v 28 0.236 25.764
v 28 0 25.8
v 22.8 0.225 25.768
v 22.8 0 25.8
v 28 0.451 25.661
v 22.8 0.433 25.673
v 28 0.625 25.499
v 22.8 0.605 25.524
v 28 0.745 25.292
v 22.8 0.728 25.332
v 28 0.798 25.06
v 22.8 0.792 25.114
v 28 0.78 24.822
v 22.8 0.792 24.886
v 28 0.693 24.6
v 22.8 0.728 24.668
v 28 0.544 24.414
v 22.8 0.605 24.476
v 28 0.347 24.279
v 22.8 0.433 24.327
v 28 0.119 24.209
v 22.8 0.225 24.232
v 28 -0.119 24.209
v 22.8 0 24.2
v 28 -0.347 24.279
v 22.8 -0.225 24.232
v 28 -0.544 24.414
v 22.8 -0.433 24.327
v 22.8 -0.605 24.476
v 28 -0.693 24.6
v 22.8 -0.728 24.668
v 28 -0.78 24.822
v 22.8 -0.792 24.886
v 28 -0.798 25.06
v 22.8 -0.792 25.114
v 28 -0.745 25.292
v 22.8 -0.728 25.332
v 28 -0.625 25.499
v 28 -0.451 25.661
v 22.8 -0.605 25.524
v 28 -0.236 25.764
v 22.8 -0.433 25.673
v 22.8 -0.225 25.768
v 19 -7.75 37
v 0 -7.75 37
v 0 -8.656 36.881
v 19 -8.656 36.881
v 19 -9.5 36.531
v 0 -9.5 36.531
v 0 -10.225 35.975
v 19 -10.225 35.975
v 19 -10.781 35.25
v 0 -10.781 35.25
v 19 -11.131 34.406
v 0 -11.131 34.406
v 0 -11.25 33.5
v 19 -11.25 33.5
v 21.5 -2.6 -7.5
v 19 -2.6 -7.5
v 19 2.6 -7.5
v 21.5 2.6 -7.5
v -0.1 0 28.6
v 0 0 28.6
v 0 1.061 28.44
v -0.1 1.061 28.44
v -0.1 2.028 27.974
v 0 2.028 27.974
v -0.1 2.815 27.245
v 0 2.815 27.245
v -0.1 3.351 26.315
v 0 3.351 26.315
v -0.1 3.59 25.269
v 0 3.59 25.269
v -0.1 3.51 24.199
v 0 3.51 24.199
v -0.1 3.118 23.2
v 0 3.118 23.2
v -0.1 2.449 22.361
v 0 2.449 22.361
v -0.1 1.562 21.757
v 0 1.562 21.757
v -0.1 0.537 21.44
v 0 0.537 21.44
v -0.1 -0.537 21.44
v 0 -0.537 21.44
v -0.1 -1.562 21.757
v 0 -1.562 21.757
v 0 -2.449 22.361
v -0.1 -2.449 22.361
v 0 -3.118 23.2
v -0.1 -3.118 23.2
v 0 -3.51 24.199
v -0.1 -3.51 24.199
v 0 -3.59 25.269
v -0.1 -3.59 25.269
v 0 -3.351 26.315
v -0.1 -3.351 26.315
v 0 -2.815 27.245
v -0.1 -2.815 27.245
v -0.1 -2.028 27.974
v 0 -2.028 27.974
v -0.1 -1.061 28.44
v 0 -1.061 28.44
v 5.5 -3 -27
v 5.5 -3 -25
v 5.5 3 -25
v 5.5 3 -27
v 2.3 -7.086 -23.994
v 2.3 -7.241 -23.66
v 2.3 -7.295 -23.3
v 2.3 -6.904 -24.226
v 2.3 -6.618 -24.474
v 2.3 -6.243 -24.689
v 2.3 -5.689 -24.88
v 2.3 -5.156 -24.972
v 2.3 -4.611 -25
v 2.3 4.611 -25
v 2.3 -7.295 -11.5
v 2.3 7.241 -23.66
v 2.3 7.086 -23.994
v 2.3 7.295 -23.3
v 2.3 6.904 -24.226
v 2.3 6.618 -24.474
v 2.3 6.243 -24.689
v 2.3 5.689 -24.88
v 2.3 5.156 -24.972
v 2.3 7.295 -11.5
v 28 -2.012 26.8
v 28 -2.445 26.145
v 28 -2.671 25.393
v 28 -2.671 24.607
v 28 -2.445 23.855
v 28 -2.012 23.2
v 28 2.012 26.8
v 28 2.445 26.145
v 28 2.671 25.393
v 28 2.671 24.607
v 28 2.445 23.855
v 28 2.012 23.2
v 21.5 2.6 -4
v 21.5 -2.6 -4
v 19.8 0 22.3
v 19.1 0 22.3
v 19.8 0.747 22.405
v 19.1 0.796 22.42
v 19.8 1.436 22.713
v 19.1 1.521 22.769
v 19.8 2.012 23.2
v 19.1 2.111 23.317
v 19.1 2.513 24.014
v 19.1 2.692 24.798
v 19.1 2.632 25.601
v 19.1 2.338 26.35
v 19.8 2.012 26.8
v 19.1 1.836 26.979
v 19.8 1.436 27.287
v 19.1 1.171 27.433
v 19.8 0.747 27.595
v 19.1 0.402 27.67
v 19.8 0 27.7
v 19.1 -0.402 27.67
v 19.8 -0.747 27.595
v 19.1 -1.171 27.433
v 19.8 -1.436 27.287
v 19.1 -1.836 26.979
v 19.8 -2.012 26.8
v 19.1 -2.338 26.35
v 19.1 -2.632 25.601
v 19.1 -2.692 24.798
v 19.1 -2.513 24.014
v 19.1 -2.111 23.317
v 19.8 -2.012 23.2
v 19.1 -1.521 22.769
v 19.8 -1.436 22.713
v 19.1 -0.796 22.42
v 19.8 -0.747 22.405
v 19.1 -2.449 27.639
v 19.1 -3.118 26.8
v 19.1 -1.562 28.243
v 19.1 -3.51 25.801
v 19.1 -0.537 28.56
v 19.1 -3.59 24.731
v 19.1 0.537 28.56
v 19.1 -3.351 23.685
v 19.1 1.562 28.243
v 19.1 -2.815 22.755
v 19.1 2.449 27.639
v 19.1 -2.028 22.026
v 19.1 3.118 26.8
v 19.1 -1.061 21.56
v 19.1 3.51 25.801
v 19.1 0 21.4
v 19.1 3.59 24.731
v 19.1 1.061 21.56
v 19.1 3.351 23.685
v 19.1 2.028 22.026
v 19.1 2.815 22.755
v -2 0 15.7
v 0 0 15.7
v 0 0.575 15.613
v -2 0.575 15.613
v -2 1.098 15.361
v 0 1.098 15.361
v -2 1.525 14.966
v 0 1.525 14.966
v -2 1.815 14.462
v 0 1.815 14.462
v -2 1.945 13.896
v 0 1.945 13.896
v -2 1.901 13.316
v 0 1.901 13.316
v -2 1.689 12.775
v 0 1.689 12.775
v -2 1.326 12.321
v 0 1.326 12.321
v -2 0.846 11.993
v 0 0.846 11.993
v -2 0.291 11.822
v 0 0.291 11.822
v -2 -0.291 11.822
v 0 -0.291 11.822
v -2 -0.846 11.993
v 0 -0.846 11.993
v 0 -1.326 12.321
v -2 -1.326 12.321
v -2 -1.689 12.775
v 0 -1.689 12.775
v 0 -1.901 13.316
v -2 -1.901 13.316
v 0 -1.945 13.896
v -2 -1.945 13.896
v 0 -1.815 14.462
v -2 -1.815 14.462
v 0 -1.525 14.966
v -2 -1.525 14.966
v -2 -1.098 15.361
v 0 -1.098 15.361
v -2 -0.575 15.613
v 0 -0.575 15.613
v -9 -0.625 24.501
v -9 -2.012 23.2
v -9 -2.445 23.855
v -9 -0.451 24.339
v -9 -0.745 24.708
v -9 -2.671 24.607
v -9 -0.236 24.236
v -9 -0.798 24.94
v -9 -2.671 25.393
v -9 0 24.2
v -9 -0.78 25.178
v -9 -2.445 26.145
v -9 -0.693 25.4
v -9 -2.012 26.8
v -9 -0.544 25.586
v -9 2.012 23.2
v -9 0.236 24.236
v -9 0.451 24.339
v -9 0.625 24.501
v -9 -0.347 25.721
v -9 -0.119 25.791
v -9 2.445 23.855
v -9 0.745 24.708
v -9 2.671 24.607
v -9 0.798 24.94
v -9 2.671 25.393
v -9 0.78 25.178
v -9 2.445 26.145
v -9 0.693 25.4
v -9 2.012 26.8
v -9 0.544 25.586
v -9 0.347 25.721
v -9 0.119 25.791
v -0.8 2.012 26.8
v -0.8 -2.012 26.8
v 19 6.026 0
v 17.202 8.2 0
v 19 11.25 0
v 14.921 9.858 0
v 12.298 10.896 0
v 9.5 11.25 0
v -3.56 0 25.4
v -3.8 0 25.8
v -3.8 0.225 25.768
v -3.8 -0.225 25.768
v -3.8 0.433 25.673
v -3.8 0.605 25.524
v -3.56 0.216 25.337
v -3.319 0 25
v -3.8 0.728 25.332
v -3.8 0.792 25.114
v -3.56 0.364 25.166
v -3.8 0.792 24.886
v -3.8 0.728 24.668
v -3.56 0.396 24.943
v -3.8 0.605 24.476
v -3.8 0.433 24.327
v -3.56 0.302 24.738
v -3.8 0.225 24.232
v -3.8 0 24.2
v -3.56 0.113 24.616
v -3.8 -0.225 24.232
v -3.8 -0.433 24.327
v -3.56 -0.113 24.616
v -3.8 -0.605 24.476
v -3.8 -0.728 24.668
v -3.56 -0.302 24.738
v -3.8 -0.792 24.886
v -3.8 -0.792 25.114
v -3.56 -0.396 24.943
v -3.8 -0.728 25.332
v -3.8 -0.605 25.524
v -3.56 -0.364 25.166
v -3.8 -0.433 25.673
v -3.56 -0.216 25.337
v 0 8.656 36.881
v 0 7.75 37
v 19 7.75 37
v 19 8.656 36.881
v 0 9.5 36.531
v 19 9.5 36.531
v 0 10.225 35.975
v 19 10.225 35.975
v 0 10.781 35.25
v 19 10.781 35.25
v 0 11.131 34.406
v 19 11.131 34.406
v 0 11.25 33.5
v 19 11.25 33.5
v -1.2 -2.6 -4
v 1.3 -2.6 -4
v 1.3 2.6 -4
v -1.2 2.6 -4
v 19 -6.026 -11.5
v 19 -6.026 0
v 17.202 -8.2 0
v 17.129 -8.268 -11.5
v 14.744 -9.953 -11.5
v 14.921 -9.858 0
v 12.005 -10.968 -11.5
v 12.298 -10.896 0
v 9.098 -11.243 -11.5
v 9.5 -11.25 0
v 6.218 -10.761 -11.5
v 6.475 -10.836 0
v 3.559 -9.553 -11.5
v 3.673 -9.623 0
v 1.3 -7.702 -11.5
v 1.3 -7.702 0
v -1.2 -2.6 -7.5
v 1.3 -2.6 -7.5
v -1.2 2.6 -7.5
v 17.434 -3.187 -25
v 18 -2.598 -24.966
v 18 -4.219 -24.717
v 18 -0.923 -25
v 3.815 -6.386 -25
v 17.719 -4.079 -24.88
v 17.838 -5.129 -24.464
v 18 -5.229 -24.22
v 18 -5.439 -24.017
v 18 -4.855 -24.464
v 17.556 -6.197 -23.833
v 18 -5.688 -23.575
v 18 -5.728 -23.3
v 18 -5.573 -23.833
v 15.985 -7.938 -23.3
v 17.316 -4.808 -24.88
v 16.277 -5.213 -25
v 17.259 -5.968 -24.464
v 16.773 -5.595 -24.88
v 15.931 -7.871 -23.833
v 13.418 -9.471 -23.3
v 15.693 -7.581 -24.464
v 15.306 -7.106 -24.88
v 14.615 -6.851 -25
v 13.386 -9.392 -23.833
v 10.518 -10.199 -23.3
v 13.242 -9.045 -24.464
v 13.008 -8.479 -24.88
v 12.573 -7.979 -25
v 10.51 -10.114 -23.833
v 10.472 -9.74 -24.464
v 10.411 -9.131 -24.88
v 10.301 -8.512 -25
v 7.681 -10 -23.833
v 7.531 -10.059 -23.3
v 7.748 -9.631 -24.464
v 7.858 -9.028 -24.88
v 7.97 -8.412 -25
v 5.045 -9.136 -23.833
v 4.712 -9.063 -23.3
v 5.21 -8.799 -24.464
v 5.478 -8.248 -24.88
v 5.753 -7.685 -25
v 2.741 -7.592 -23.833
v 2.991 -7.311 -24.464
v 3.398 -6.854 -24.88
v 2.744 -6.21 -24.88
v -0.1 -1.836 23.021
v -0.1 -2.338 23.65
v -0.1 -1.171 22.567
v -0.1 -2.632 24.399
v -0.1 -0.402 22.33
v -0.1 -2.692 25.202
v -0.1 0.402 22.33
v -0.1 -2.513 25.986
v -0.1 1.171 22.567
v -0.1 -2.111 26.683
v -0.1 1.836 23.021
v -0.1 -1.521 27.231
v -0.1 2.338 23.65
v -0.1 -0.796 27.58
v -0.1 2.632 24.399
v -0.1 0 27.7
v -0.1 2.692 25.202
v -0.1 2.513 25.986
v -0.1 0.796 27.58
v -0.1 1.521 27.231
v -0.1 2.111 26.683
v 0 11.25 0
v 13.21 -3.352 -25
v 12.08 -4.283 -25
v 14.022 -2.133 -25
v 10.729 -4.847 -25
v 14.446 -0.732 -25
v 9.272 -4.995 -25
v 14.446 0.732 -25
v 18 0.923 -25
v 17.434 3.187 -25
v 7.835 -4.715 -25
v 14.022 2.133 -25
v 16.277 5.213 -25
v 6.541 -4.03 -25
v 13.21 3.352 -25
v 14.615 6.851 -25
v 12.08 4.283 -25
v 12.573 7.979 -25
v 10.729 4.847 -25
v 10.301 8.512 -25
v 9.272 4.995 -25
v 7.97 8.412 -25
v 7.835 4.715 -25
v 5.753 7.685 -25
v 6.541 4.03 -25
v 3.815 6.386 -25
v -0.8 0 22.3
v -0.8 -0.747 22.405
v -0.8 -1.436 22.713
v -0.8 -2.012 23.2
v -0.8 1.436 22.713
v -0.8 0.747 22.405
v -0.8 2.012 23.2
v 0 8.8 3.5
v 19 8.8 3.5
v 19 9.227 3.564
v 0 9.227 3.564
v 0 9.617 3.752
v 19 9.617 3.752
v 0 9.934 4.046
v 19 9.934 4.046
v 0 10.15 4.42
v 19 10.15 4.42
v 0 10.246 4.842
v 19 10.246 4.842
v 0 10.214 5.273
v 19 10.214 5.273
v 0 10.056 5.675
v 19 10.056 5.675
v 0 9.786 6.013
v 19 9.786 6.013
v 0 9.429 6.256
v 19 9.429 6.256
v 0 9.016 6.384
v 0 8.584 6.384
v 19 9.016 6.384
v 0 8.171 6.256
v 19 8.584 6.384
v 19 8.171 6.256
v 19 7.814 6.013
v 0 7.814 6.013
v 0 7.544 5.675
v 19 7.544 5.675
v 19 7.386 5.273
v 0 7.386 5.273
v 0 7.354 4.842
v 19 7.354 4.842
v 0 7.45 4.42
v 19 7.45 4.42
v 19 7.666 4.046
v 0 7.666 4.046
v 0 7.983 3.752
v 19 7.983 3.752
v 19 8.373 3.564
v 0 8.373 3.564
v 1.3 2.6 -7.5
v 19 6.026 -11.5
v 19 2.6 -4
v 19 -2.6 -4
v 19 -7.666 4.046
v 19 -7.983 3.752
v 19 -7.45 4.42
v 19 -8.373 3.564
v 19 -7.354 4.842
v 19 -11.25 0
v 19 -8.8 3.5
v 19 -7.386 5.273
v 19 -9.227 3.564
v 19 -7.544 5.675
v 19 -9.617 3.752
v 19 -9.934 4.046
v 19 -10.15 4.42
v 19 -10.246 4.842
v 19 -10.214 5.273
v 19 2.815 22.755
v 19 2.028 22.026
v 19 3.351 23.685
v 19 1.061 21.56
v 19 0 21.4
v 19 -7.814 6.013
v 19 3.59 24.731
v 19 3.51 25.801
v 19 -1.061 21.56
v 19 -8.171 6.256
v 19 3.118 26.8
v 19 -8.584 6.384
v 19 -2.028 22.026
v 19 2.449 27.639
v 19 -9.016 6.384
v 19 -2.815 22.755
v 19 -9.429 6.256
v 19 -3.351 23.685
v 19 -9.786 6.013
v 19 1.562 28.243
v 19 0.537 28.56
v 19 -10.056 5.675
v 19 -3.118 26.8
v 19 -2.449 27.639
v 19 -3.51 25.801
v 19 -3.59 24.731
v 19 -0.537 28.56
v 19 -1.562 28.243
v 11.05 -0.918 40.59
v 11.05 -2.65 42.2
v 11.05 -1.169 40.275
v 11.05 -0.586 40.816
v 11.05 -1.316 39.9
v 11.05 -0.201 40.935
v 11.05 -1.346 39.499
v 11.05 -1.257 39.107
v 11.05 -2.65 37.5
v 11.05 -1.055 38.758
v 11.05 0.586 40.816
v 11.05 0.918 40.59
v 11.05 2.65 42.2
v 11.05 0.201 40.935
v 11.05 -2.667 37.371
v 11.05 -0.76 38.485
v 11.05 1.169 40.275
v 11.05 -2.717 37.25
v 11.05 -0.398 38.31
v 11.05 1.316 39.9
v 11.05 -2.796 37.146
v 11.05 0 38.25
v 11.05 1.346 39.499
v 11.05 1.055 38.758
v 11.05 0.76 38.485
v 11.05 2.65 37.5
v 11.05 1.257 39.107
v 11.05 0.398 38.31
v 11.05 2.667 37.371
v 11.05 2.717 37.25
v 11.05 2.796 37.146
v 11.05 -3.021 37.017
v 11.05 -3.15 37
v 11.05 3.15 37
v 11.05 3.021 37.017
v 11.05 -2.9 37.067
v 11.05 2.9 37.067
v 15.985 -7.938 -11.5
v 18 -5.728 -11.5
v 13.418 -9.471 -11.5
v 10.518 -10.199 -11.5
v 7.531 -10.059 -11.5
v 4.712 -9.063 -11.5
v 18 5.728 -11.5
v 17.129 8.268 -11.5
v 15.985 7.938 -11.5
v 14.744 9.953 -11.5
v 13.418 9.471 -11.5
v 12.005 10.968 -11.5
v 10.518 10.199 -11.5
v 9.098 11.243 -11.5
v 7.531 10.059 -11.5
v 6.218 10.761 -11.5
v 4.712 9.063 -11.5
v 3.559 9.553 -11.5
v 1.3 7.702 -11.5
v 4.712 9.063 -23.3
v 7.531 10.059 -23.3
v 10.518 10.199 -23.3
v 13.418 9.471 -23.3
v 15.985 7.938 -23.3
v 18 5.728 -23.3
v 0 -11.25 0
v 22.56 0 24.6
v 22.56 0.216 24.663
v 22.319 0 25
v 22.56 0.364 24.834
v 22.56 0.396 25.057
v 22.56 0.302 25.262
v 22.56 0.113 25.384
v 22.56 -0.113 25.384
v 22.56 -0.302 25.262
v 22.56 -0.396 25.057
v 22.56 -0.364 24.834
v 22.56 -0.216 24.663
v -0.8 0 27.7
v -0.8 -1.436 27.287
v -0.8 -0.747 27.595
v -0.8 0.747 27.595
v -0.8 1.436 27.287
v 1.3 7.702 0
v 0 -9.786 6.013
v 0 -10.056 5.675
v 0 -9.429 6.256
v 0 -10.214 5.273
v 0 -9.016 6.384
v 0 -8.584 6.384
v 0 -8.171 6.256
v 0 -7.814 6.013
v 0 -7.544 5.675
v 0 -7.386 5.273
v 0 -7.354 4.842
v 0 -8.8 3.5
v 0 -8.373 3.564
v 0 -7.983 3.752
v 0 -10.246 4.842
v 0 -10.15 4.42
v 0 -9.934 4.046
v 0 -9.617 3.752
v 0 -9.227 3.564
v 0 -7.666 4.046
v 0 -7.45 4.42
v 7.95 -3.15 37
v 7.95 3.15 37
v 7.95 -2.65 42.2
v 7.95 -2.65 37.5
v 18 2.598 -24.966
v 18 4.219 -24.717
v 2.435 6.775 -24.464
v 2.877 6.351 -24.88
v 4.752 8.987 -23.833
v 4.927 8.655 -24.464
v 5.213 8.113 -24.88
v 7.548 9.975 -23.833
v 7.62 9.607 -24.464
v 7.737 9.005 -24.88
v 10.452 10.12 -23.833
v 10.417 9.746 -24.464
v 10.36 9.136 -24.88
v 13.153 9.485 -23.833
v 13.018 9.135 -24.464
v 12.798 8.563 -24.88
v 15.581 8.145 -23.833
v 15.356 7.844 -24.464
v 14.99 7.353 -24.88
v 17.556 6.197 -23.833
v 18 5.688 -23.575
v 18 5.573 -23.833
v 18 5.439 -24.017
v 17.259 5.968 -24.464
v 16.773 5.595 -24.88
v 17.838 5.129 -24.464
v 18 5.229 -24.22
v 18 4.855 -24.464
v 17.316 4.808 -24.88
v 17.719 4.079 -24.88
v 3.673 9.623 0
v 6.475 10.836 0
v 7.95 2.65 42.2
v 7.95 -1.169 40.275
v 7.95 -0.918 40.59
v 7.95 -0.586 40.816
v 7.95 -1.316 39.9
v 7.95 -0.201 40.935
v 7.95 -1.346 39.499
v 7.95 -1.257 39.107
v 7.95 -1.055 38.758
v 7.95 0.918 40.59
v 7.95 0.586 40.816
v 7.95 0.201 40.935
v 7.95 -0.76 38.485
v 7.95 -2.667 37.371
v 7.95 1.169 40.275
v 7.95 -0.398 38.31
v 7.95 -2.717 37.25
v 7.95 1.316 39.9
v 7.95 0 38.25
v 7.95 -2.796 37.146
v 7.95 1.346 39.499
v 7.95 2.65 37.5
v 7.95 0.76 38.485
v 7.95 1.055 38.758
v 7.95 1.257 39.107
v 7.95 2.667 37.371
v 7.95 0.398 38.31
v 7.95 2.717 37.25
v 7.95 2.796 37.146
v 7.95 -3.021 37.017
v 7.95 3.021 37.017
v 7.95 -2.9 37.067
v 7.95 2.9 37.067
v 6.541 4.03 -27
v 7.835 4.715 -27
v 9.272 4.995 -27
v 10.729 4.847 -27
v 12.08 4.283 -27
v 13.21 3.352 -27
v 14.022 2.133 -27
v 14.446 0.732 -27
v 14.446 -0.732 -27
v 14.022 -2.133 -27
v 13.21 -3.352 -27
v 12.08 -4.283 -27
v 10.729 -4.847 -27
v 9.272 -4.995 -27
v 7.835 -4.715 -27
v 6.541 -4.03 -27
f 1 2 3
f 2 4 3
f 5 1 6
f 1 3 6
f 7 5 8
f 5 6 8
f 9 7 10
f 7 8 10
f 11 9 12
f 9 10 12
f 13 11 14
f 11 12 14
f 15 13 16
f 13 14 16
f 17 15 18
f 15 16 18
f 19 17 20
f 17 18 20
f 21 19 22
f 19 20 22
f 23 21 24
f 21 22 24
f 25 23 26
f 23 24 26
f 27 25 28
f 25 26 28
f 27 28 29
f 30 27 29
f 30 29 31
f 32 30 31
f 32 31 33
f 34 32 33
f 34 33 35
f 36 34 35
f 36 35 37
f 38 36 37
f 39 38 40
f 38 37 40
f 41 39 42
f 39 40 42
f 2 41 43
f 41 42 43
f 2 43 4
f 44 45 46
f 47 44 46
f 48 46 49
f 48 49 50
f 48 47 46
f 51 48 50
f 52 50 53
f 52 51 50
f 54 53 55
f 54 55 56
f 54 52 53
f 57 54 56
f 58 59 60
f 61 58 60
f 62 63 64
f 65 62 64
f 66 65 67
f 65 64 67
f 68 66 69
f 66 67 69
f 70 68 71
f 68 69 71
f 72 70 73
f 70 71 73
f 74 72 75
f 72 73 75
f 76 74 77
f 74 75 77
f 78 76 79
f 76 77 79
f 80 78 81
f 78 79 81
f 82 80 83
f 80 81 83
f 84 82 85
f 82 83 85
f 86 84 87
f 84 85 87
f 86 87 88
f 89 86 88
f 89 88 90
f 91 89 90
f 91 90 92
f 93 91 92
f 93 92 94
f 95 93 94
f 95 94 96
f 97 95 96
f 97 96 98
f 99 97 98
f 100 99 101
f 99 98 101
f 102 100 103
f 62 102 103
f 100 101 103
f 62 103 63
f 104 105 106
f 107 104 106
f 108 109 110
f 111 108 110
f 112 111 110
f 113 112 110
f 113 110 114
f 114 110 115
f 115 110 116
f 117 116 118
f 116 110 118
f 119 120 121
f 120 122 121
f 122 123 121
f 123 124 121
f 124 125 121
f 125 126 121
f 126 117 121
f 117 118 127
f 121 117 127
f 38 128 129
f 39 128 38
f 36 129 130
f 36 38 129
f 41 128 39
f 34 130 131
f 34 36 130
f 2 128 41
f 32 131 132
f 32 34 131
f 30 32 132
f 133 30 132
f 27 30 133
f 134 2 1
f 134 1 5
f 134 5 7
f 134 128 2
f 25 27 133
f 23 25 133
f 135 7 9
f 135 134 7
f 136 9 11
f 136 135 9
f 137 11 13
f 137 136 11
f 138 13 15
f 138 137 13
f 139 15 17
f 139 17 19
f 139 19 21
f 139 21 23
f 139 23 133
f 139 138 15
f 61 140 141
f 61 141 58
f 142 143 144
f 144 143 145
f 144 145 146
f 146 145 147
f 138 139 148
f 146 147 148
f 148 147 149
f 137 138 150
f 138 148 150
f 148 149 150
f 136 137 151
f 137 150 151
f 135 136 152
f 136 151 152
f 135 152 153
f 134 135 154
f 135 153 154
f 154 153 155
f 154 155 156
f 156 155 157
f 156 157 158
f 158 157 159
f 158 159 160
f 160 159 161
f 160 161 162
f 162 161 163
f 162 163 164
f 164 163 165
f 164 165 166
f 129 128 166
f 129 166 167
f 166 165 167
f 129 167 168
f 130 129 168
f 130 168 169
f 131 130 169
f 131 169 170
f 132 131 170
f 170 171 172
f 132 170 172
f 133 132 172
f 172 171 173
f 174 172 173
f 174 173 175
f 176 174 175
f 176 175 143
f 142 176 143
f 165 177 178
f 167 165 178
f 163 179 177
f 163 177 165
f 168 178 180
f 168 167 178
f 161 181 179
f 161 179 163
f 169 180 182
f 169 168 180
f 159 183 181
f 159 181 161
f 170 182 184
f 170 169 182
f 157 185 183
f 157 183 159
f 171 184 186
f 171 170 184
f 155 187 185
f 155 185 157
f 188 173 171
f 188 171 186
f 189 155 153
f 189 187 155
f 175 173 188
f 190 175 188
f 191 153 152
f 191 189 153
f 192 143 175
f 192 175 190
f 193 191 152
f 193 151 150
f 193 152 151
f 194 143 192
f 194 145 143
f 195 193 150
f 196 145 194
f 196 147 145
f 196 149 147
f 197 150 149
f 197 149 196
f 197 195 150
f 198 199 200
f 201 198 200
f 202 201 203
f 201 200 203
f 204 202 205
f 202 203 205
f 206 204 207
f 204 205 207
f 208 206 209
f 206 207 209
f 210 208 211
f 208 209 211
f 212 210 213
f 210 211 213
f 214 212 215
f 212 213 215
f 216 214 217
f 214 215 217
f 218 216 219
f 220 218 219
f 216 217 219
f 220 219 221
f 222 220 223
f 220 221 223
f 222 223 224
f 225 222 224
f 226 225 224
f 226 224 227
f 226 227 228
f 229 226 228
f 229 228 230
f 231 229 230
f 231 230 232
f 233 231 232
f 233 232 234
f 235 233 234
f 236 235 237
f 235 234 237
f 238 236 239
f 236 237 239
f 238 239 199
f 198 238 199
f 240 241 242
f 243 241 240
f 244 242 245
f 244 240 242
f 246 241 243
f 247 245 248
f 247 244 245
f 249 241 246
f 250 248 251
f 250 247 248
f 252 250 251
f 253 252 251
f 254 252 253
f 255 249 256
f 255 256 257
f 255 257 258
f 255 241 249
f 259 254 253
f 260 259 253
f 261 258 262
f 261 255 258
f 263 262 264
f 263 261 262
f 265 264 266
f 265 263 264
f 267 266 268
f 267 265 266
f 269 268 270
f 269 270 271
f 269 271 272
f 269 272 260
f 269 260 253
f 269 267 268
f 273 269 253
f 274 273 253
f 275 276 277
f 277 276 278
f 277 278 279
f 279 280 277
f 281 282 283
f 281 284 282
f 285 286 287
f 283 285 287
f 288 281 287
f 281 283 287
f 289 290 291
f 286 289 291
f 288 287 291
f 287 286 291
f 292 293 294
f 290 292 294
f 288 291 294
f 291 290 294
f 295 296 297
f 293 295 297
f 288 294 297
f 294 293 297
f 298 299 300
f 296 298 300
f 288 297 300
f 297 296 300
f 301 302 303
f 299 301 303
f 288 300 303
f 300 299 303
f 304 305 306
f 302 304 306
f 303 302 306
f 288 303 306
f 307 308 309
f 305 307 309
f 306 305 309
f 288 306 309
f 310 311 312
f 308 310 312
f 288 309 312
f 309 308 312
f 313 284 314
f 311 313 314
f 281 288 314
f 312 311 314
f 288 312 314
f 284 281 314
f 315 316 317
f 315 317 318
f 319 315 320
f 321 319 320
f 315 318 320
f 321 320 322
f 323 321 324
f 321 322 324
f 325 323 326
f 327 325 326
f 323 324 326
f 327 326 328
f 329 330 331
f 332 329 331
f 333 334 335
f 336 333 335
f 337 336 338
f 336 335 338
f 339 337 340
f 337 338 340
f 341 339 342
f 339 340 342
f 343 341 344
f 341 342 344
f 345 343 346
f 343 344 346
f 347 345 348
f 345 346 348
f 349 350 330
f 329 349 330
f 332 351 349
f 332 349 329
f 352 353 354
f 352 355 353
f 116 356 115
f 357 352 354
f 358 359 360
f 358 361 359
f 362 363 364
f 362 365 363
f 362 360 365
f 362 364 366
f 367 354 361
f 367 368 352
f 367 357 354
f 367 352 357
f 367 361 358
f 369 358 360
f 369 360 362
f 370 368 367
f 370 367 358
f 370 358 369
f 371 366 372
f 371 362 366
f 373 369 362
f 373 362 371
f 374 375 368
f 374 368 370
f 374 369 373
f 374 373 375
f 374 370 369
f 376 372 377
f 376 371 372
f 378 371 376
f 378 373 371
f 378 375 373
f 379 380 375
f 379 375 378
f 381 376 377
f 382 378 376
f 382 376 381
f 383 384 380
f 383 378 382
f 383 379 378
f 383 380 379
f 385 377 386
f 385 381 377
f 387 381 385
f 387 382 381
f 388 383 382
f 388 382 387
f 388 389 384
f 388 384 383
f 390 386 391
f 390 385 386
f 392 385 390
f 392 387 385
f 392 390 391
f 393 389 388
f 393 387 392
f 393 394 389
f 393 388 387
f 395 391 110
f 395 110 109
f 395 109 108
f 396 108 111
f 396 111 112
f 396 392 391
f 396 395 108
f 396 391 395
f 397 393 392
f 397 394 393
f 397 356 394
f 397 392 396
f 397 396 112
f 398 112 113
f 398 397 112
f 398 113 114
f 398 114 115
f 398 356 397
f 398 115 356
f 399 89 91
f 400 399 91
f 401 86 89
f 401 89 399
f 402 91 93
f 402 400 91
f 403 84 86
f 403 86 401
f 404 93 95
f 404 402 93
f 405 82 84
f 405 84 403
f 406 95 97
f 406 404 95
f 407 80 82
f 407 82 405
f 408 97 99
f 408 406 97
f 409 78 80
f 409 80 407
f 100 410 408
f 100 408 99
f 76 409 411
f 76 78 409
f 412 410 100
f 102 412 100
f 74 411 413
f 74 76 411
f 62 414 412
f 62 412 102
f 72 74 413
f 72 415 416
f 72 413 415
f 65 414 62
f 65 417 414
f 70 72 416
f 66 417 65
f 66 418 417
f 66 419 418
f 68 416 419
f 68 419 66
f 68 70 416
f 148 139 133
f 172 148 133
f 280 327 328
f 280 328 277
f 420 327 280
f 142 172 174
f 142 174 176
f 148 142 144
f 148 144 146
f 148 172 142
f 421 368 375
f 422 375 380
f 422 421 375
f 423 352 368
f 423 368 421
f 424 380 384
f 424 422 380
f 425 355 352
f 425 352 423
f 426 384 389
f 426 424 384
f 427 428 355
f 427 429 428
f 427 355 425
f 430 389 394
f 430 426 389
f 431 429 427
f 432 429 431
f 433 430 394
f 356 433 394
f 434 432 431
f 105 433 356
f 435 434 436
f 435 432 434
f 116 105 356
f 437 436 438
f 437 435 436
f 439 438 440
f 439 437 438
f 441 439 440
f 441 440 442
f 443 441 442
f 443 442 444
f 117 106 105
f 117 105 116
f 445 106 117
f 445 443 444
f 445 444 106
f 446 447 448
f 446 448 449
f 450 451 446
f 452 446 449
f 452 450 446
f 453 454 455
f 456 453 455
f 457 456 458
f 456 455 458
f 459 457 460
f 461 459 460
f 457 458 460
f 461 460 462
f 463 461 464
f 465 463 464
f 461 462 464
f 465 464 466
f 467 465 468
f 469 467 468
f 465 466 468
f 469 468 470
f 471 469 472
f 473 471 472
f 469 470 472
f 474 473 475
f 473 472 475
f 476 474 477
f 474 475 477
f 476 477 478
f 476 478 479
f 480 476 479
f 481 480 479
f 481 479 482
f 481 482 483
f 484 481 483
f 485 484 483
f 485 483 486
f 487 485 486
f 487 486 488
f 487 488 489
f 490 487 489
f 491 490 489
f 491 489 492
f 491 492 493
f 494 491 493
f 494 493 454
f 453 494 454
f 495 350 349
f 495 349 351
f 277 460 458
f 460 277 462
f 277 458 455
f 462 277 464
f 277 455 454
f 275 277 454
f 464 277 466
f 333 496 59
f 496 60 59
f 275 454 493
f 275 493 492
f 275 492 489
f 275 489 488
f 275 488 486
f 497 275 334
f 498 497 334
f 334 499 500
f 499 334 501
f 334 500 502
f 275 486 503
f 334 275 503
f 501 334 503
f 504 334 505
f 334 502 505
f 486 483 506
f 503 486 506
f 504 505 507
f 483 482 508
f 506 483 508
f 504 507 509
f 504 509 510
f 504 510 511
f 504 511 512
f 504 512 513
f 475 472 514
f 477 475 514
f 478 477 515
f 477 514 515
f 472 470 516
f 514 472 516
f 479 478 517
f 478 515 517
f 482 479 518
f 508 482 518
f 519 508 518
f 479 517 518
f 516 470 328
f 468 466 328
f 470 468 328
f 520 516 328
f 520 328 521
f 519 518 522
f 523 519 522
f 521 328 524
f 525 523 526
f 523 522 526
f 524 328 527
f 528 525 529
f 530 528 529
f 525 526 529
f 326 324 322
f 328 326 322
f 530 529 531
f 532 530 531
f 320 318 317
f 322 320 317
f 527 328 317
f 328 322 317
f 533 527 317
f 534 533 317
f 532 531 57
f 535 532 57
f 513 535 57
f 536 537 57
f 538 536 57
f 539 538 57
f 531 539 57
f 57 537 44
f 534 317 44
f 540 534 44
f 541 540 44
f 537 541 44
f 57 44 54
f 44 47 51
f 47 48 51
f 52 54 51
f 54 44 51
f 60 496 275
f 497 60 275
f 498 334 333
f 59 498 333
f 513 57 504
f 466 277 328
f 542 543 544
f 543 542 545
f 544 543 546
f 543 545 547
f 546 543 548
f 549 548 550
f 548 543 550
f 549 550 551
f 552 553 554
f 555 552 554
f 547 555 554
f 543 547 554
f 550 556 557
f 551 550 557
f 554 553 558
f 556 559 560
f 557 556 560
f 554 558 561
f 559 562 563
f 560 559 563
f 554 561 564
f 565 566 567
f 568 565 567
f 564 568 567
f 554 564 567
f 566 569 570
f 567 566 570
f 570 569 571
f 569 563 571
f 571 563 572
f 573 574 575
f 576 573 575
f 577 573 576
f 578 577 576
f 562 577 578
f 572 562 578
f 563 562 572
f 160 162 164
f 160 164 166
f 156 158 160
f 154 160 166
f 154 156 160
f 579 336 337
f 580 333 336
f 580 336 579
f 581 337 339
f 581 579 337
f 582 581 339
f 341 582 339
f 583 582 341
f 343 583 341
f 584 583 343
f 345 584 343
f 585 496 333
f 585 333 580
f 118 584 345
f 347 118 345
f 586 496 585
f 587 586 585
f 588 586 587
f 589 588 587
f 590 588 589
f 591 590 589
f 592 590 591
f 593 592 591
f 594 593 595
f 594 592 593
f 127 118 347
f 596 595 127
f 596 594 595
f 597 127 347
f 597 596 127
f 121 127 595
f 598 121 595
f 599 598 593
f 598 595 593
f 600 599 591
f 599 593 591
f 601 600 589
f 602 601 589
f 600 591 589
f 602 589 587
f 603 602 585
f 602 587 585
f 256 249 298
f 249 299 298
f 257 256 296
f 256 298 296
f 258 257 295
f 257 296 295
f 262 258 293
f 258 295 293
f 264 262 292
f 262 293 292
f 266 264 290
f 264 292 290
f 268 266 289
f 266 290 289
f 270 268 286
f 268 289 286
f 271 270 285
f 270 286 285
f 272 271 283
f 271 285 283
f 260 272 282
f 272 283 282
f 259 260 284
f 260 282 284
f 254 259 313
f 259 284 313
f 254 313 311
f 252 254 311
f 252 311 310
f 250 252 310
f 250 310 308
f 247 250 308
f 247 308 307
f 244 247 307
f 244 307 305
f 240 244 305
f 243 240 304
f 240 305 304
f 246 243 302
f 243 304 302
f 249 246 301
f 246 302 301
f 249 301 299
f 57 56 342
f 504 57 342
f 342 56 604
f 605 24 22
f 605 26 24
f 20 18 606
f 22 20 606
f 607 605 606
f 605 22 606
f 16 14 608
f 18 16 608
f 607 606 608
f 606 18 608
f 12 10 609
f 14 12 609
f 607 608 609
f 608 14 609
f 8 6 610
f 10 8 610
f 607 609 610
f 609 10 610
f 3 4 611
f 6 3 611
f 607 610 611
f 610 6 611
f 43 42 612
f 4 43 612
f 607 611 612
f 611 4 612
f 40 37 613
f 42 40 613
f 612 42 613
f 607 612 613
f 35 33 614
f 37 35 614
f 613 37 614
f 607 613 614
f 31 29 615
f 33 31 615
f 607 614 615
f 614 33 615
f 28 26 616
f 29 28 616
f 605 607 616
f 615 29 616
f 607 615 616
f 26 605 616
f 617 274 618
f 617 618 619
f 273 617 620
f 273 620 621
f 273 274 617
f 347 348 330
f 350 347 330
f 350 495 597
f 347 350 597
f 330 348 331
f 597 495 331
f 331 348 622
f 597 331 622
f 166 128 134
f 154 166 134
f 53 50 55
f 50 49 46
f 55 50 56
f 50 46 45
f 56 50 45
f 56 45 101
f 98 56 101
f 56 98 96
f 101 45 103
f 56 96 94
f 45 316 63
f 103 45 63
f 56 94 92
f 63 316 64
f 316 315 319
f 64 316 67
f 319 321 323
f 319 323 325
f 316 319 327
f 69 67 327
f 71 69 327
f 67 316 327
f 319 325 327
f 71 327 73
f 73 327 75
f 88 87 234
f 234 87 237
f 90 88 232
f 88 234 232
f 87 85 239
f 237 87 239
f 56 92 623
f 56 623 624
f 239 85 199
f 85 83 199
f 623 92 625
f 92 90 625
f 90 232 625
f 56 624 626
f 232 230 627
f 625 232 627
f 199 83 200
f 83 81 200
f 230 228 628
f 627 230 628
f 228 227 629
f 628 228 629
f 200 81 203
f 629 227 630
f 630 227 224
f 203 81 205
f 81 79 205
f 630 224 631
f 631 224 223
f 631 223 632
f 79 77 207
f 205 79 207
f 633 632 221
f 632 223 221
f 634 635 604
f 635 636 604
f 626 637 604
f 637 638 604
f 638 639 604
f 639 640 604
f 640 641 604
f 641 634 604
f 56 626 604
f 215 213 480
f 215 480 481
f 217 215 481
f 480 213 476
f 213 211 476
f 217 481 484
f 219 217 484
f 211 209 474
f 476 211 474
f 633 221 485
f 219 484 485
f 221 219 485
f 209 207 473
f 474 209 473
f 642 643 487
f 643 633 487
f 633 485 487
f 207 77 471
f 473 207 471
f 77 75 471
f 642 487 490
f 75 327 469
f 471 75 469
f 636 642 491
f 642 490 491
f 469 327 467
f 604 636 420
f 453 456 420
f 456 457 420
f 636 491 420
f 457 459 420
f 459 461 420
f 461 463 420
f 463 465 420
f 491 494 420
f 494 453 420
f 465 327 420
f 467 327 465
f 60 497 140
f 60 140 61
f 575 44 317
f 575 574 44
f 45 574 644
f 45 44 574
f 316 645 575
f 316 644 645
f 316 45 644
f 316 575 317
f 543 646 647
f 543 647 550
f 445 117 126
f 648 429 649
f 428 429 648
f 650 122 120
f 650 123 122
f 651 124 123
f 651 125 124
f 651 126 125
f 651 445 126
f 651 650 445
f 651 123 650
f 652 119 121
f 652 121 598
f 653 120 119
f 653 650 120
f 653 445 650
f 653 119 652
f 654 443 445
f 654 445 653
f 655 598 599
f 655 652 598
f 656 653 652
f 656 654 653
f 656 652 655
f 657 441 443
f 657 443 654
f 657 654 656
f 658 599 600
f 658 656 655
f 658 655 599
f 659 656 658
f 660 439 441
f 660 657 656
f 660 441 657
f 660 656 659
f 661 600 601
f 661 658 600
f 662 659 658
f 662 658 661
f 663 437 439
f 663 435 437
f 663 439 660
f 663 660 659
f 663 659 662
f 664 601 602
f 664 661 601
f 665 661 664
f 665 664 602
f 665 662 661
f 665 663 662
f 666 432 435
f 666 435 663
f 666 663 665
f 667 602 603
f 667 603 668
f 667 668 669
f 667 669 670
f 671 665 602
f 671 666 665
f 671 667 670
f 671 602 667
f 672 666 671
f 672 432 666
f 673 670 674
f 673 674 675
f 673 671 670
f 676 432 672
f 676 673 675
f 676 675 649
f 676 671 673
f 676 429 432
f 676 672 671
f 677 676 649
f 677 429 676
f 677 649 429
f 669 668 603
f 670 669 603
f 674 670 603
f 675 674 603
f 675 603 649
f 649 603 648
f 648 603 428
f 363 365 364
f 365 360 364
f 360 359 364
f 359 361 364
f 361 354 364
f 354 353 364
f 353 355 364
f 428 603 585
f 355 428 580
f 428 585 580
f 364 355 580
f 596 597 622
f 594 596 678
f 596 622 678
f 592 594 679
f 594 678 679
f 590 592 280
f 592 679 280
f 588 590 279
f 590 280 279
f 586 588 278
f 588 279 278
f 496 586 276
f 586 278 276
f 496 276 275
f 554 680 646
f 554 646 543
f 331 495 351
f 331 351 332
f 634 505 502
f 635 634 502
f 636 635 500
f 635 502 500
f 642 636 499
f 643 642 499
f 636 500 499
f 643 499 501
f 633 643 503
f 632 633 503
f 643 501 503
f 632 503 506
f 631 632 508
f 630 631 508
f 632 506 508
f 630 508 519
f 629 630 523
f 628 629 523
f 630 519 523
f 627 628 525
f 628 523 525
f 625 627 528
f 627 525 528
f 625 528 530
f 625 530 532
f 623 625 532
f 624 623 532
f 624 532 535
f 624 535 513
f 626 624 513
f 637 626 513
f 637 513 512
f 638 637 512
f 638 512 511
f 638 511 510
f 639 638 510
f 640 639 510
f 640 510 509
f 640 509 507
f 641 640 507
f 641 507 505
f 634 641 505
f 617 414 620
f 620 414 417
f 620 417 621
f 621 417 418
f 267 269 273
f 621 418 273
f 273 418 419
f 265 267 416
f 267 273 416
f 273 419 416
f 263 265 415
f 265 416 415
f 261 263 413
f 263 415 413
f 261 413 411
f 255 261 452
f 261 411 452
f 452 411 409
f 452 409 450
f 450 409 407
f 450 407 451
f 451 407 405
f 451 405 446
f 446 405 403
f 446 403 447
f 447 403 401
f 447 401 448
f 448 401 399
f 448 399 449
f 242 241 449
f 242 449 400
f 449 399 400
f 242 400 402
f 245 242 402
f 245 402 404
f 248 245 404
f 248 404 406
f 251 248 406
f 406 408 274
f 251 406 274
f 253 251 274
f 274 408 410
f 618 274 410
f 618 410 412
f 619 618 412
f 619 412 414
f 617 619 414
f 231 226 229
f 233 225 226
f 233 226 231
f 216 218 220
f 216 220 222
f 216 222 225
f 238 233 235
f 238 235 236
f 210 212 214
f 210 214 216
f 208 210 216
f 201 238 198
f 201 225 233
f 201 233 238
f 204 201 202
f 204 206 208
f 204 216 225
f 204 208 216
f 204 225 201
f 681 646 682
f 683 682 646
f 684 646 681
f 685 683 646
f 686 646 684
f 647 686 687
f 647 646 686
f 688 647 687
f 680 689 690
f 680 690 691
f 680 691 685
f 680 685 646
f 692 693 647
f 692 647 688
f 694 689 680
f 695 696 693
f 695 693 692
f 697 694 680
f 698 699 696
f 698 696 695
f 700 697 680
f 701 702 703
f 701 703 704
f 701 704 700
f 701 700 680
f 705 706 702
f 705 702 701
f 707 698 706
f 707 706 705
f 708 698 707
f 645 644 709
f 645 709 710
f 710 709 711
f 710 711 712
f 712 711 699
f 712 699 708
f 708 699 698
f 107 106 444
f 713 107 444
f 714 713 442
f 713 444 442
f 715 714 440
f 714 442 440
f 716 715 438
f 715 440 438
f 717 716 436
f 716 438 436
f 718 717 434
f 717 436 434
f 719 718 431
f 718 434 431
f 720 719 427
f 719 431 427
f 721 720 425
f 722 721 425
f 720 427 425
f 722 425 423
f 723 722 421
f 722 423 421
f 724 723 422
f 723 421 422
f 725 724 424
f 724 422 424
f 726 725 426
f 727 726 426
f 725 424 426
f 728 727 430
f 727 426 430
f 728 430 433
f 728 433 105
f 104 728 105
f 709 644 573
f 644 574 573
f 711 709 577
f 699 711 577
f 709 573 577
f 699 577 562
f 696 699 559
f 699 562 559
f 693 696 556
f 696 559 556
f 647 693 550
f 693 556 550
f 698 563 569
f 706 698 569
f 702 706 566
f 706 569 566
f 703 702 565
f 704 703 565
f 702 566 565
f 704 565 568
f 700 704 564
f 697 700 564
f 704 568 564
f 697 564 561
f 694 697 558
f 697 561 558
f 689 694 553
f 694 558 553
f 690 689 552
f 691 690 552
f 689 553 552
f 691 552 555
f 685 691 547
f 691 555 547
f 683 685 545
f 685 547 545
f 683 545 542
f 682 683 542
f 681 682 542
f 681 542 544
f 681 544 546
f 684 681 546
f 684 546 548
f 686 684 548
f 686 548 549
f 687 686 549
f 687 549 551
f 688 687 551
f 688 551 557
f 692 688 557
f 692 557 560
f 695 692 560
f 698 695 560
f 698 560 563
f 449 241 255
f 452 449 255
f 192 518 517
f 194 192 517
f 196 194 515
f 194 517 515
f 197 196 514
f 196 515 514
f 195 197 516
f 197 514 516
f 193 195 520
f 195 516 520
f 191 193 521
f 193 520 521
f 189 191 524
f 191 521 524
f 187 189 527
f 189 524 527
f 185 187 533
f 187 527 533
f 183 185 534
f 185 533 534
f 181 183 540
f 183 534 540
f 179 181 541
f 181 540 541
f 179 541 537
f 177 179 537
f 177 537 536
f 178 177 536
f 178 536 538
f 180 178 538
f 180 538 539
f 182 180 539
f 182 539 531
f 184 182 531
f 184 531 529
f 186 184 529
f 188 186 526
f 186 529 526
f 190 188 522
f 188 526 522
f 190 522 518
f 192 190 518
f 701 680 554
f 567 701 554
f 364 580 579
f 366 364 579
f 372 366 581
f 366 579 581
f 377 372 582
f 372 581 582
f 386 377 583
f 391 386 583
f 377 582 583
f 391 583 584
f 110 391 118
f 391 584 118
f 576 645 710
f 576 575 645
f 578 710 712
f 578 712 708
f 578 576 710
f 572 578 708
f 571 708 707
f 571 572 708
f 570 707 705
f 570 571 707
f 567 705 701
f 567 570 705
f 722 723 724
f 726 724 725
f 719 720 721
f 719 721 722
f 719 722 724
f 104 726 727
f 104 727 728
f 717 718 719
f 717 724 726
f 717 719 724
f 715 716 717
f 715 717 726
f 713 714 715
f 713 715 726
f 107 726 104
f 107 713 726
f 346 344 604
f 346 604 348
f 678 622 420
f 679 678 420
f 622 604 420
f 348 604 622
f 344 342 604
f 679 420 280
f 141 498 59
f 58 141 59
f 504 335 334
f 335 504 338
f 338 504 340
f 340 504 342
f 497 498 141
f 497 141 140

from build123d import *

# Parameters (mm, degrees)
SKETCH1_W                 = 37
SKETCH1_H                 = 22.5
BOSS_EXTRUDE1_DEPTH       = 19
SKETCH2_W                 = 3.1
SKETCH2_H                 = 5.3
BOSS_EXTRUDE2_DEPTH       = 5.2
SKETCH3_R                 = 1.35
CUT_EXTRUDE1_DEPTH        = 12.05
FILLET1_R                 = 3.5
SKETCH4_R                 = 3.6
BOSS_EXTRUDE3_DEPTH       = 0.1
SKETCH5_R                 = 3.6
BOSS_EXTRUDE4_DEPTH       = 0.1
SKETCH6_R                 = 2.7
BOSS_EXTRUDE5_DEPTH       = 8.9
SKETCH7_R                 = 2.7
BOSS_EXTRUDE6_DEPTH       = 8.9
FILLET2_R                 = 0.5
CUT_EXTRUDE2_DEPTH        = 8.2
CUT_EXTRUDE3_DEPTH        = 8.2
M2X0_4_TAPPED_HOLE1_D     = 1.6
M2X0_4_TAPPED_HOLE1_DEPTH = 5.2
M2X0_4_TAPPED_HOLE1_TIP   = 0.480688495
M2X0_4_TAPPED_HOLE2_D     = 1.6
M2X0_4_TAPPED_HOLE2_DEPTH = 5.2
M2X0_4_TAPPED_HOLE2_TIP   = 0.480688495
SKETCH16_R                = 1.95
BOSS_EXTRUDE7_DEPTH       = 2
BOSS_EXTRUDE8_DEPTH       = 11.5
SKETCH18_W                = 3.5
SKETCH18_H                = 5.2
BOSS_EXTRUDE9_DEPTH       = 2.5
SKETCH19_W                = 3.5
SKETCH19_H                = 5.2
BOSS_EXTRUDE10_DEPTH      = 2.5
BOSS_EXTRUDE11_DEPTH      = 13.5
FILLET3_R                 = 1.7
BOSS_EXTRUDE12_DEPTH      = 2
SKETCH25_R                = 1.45
CUT_EXTRUDE5_DEPTH        = 29


with BuildPart() as part:
    # Sketch1 → Boss-Extrude1 (new body)
    with BuildSketch(Plane(origin=(0, 0, 0), x_dir=(0, 0, -1), z_dir=(1, 0, 0))):
        with Locations((-18.5, 0)):
            Rectangle(SKETCH1_W, SKETCH1_H)
    extrude(amount=BOSS_EXTRUDE1_DEPTH)

    # Sketch2 → Boss-Extrude2 (add)
    with BuildSketch(Plane.XY.offset(37)):
        with Locations((9.5, 0)):
            Rectangle(SKETCH2_W, SKETCH2_H)
    extrude(amount=BOSS_EXTRUDE2_DEPTH)

    # Sketch3 → Cut-Extrude1 (cut, through all)
    with BuildSketch(Plane(origin=(11.05, 0, 0), x_dir=(0, 0, -1), z_dir=(1, 0, 0))):
        with Locations((-39.6, 0)):
            Circle(SKETCH3_R)
    extrude(amount=-CUT_EXTRUDE1_DEPTH, mode=Mode.SUBTRACT)

    # Fillet1
    fillet1_edges = [part.edges().sort_by_distance(p)[0] for p in [
        (9.5, -11.25, 37),
        (9.5, 11.25, 37),
    ]]
    fillet(fillet1_edges, radius=FILLET1_R)

    # Sketch4 → Boss-Extrude3 (add)
    with BuildSketch(Plane(origin=(19, 0, 0), x_dir=(0, 0, -1), z_dir=(1, 0, 0))):
        with Locations((-25, 0)):
            Circle(SKETCH4_R)
    extrude(amount=BOSS_EXTRUDE3_DEPTH)

    # Sketch5 → Boss-Extrude4 (add)
    with BuildSketch(Plane.ZY):
        with Locations((25, 0)):
            Circle(SKETCH5_R)
    extrude(amount=BOSS_EXTRUDE4_DEPTH)

    # Sketch6 → Boss-Extrude5 (add)
    with BuildSketch(Plane(origin=(19.1, 0, 0), x_dir=(0, 0, -1), z_dir=(1, 0, 0))):
        with Locations((-25, 0)):
            Circle(SKETCH6_R)
    extrude(amount=BOSS_EXTRUDE5_DEPTH)

    # Sketch7 → Boss-Extrude6 (add)
    with BuildSketch(Plane.ZY.offset(0.1)):
        with Locations((25, 0)):
            Circle(SKETCH7_R)
    extrude(amount=BOSS_EXTRUDE6_DEPTH)

    # Fillet2
    fillet2_edges = [part.edges().sort_by_distance(p)[0] for p in [
        (9.5, 2.65, 37),
        (9.5, -2.65, 37),
    ]]
    fillet(fillet2_edges, radius=FILLET2_R)

    # Sketch8 → Cut-Extrude2 (cut)
    with BuildSketch(Plane(origin=(28, 0, 0), x_dir=(0, 0, -1), z_dir=(1, 0, 0))):
        with BuildLine():
            Line((-26.8, -2.01246118), (-26.8, 2.01246118))
            ThreePointArc((-26.8, 2.01246118), (-27.7, 0), (-26.8, -2.01246118))
        make_face()
        with BuildLine():
            ThreePointArc((-22.3, 0), (-22.535248491, 1.102270384), (-23.2, 2.01246118))
            Line((-23.2, 2.01246118), (-23.2, -2.01246118))
            ThreePointArc((-23.2, -2.01246118), (-22.535248491, -1.102270384), (-22.3, 0))
        make_face()
    extrude(amount=-CUT_EXTRUDE2_DEPTH, mode=Mode.SUBTRACT)

    # Sketch9 → Cut-Extrude3 (cut)
    with BuildSketch(Plane.ZY.offset(9)):
        with BuildLine():
            Line((23.2, -2.01246118), (23.2, 2.01246118))
            ThreePointArc((23.2, 2.01246118), (22.3, 0), (23.2, -2.01246118))
        make_face()
        with BuildLine():
            ThreePointArc((27.7, 0), (27.464751509, 1.102270384), (26.8, 2.01246118))
            Line((26.8, 2.01246118), (26.8, -2.01246118))
            ThreePointArc((26.8, -2.01246118), (27.464751509, -1.102270384), (27.7, 0))
        make_face()
    extrude(amount=-CUT_EXTRUDE3_DEPTH, mode=Mode.SUBTRACT)

    # M2x0.4 Tapped Hole1
    with Locations(Plane(origin=(28, 0, 0), x_dir=(0, 0, -1), z_dir=(1, 0, 0))):
        with Locations((-25, 0)):
            Hole(M2X0_4_TAPPED_HOLE1_D / 2, depth=M2X0_4_TAPPED_HOLE1_DEPTH)
            with Locations((0, 0, -(M2X0_4_TAPPED_HOLE1_DEPTH + M2X0_4_TAPPED_HOLE1_TIP / 2))):  # 118° drill point
                Cone(0, M2X0_4_TAPPED_HOLE1_D / 2, M2X0_4_TAPPED_HOLE1_TIP, mode=Mode.SUBTRACT)

    # M2x0.4 Tapped Hole2
    with Locations(Plane.ZY.offset(9)):
        with Locations((25, 0)):
            Hole(M2X0_4_TAPPED_HOLE2_D / 2, depth=M2X0_4_TAPPED_HOLE2_DEPTH)
            with Locations((0, 0, -(M2X0_4_TAPPED_HOLE2_DEPTH + M2X0_4_TAPPED_HOLE2_TIP / 2))):  # 118° drill point
                Cone(0, M2X0_4_TAPPED_HOLE2_D / 2, M2X0_4_TAPPED_HOLE2_TIP, mode=Mode.SUBTRACT)

    # Sketch16 → Boss-Extrude7 (add)
    with BuildSketch(Plane.ZY):
        with Locations((13.75, 0)):
            Circle(SKETCH16_R)
    extrude(amount=BOSS_EXTRUDE7_DEPTH)

    # Sketch17 → Boss-Extrude8 (add)
    with BuildSketch(Plane(origin=(0, 0, 0), x_dir=(-1, 0, 0), z_dir=(0, 0, -1))):
        with BuildLine():
            Line((-19, 6.025985397), (-19, -6.025985397))
            ThreePointArc((-19, -6.025985397), (-10.560588754, -11.199895156), (-1.3, -7.7021101))
            Line((-1.3, -7.7021101), (-1.3, 7.7021101))
            ThreePointArc((-1.3, 7.7021101), (-10.560588754, 11.199895156), (-19, 6.025985397))
        make_face()
    extrude(amount=BOSS_EXTRUDE8_DEPTH)

    # Sketch18 → Boss-Extrude9 (add)
    with BuildSketch(Plane(origin=(19, 0, 0), x_dir=(0, 0, -1), z_dir=(1, 0, 0))):
        with Locations((5.75, 0)):
            Rectangle(SKETCH18_W, SKETCH18_H)
    extrude(amount=BOSS_EXTRUDE9_DEPTH)

    # Sketch19 → Boss-Extrude10 (add)
    with BuildSketch(Plane.ZY.offset(-1.3)):
        with Locations((-5.75, 0)):
            Rectangle(SKETCH19_W, SKETCH19_H)
    extrude(amount=BOSS_EXTRUDE10_DEPTH)

    # Sketch20 → Boss-Extrude11 (add)
    with BuildSketch(Plane(origin=(0, 0, -11.5), x_dir=(-1, 0, 0), z_dir=(0, 0, -1))):
        with BuildLine():
            Line((-18, 5.728219619), (-18, -5.728219619))
            ThreePointArc((-18, -5.728219619), (-10.518083587, -10.199313987), (-2.3, -7.295375247))
            Line((-2.3, -7.295375247), (-2.3, 7.295375247))
            ThreePointArc((-2.3, 7.295375247), (-10.518083587, 10.199313987), (-18, 5.728219619))
        make_face()
    extrude(amount=BOSS_EXTRUDE11_DEPTH)

    # Fillet3
    fillet3_edges = [part.edges().sort_by_distance(p)[0] for p in [
        (10.518083587, 10.199313987, -25),
        (10.518083587, -10.199313987, -25),
    ]]
    fillet(fillet3_edges, radius=FILLET3_R)

    # Sketch21 → Boss-Extrude12 (add)
    with BuildSketch(Plane(origin=(0, 0, -25), x_dir=(-1, 0, 0), z_dir=(0, 0, -1))):
        with BuildLine():
            Line((-5.5, -3), (-5.5, 3))
            ThreePointArc((-5.5, 3), (-14.5, 0), (-5.5, -3))
        make_face()
    extrude(amount=BOSS_EXTRUDE12_DEPTH)

    # Sketch25 → Cut-Extrude5 (cut, through all)
    with BuildSketch(Plane(origin=(19, 0, 0), x_dir=(0, 0, -1), z_dir=(1, 0, 0))):
        with Locations((-4.95, 8.8)):
            Circle(SKETCH25_R)
        with Locations((-4.95, -8.8)):
            Circle(SKETCH25_R)
    extrude(amount=-CUT_EXTRUDE5_DEPTH, mode=Mode.SUBTRACT)


solid = part.part
